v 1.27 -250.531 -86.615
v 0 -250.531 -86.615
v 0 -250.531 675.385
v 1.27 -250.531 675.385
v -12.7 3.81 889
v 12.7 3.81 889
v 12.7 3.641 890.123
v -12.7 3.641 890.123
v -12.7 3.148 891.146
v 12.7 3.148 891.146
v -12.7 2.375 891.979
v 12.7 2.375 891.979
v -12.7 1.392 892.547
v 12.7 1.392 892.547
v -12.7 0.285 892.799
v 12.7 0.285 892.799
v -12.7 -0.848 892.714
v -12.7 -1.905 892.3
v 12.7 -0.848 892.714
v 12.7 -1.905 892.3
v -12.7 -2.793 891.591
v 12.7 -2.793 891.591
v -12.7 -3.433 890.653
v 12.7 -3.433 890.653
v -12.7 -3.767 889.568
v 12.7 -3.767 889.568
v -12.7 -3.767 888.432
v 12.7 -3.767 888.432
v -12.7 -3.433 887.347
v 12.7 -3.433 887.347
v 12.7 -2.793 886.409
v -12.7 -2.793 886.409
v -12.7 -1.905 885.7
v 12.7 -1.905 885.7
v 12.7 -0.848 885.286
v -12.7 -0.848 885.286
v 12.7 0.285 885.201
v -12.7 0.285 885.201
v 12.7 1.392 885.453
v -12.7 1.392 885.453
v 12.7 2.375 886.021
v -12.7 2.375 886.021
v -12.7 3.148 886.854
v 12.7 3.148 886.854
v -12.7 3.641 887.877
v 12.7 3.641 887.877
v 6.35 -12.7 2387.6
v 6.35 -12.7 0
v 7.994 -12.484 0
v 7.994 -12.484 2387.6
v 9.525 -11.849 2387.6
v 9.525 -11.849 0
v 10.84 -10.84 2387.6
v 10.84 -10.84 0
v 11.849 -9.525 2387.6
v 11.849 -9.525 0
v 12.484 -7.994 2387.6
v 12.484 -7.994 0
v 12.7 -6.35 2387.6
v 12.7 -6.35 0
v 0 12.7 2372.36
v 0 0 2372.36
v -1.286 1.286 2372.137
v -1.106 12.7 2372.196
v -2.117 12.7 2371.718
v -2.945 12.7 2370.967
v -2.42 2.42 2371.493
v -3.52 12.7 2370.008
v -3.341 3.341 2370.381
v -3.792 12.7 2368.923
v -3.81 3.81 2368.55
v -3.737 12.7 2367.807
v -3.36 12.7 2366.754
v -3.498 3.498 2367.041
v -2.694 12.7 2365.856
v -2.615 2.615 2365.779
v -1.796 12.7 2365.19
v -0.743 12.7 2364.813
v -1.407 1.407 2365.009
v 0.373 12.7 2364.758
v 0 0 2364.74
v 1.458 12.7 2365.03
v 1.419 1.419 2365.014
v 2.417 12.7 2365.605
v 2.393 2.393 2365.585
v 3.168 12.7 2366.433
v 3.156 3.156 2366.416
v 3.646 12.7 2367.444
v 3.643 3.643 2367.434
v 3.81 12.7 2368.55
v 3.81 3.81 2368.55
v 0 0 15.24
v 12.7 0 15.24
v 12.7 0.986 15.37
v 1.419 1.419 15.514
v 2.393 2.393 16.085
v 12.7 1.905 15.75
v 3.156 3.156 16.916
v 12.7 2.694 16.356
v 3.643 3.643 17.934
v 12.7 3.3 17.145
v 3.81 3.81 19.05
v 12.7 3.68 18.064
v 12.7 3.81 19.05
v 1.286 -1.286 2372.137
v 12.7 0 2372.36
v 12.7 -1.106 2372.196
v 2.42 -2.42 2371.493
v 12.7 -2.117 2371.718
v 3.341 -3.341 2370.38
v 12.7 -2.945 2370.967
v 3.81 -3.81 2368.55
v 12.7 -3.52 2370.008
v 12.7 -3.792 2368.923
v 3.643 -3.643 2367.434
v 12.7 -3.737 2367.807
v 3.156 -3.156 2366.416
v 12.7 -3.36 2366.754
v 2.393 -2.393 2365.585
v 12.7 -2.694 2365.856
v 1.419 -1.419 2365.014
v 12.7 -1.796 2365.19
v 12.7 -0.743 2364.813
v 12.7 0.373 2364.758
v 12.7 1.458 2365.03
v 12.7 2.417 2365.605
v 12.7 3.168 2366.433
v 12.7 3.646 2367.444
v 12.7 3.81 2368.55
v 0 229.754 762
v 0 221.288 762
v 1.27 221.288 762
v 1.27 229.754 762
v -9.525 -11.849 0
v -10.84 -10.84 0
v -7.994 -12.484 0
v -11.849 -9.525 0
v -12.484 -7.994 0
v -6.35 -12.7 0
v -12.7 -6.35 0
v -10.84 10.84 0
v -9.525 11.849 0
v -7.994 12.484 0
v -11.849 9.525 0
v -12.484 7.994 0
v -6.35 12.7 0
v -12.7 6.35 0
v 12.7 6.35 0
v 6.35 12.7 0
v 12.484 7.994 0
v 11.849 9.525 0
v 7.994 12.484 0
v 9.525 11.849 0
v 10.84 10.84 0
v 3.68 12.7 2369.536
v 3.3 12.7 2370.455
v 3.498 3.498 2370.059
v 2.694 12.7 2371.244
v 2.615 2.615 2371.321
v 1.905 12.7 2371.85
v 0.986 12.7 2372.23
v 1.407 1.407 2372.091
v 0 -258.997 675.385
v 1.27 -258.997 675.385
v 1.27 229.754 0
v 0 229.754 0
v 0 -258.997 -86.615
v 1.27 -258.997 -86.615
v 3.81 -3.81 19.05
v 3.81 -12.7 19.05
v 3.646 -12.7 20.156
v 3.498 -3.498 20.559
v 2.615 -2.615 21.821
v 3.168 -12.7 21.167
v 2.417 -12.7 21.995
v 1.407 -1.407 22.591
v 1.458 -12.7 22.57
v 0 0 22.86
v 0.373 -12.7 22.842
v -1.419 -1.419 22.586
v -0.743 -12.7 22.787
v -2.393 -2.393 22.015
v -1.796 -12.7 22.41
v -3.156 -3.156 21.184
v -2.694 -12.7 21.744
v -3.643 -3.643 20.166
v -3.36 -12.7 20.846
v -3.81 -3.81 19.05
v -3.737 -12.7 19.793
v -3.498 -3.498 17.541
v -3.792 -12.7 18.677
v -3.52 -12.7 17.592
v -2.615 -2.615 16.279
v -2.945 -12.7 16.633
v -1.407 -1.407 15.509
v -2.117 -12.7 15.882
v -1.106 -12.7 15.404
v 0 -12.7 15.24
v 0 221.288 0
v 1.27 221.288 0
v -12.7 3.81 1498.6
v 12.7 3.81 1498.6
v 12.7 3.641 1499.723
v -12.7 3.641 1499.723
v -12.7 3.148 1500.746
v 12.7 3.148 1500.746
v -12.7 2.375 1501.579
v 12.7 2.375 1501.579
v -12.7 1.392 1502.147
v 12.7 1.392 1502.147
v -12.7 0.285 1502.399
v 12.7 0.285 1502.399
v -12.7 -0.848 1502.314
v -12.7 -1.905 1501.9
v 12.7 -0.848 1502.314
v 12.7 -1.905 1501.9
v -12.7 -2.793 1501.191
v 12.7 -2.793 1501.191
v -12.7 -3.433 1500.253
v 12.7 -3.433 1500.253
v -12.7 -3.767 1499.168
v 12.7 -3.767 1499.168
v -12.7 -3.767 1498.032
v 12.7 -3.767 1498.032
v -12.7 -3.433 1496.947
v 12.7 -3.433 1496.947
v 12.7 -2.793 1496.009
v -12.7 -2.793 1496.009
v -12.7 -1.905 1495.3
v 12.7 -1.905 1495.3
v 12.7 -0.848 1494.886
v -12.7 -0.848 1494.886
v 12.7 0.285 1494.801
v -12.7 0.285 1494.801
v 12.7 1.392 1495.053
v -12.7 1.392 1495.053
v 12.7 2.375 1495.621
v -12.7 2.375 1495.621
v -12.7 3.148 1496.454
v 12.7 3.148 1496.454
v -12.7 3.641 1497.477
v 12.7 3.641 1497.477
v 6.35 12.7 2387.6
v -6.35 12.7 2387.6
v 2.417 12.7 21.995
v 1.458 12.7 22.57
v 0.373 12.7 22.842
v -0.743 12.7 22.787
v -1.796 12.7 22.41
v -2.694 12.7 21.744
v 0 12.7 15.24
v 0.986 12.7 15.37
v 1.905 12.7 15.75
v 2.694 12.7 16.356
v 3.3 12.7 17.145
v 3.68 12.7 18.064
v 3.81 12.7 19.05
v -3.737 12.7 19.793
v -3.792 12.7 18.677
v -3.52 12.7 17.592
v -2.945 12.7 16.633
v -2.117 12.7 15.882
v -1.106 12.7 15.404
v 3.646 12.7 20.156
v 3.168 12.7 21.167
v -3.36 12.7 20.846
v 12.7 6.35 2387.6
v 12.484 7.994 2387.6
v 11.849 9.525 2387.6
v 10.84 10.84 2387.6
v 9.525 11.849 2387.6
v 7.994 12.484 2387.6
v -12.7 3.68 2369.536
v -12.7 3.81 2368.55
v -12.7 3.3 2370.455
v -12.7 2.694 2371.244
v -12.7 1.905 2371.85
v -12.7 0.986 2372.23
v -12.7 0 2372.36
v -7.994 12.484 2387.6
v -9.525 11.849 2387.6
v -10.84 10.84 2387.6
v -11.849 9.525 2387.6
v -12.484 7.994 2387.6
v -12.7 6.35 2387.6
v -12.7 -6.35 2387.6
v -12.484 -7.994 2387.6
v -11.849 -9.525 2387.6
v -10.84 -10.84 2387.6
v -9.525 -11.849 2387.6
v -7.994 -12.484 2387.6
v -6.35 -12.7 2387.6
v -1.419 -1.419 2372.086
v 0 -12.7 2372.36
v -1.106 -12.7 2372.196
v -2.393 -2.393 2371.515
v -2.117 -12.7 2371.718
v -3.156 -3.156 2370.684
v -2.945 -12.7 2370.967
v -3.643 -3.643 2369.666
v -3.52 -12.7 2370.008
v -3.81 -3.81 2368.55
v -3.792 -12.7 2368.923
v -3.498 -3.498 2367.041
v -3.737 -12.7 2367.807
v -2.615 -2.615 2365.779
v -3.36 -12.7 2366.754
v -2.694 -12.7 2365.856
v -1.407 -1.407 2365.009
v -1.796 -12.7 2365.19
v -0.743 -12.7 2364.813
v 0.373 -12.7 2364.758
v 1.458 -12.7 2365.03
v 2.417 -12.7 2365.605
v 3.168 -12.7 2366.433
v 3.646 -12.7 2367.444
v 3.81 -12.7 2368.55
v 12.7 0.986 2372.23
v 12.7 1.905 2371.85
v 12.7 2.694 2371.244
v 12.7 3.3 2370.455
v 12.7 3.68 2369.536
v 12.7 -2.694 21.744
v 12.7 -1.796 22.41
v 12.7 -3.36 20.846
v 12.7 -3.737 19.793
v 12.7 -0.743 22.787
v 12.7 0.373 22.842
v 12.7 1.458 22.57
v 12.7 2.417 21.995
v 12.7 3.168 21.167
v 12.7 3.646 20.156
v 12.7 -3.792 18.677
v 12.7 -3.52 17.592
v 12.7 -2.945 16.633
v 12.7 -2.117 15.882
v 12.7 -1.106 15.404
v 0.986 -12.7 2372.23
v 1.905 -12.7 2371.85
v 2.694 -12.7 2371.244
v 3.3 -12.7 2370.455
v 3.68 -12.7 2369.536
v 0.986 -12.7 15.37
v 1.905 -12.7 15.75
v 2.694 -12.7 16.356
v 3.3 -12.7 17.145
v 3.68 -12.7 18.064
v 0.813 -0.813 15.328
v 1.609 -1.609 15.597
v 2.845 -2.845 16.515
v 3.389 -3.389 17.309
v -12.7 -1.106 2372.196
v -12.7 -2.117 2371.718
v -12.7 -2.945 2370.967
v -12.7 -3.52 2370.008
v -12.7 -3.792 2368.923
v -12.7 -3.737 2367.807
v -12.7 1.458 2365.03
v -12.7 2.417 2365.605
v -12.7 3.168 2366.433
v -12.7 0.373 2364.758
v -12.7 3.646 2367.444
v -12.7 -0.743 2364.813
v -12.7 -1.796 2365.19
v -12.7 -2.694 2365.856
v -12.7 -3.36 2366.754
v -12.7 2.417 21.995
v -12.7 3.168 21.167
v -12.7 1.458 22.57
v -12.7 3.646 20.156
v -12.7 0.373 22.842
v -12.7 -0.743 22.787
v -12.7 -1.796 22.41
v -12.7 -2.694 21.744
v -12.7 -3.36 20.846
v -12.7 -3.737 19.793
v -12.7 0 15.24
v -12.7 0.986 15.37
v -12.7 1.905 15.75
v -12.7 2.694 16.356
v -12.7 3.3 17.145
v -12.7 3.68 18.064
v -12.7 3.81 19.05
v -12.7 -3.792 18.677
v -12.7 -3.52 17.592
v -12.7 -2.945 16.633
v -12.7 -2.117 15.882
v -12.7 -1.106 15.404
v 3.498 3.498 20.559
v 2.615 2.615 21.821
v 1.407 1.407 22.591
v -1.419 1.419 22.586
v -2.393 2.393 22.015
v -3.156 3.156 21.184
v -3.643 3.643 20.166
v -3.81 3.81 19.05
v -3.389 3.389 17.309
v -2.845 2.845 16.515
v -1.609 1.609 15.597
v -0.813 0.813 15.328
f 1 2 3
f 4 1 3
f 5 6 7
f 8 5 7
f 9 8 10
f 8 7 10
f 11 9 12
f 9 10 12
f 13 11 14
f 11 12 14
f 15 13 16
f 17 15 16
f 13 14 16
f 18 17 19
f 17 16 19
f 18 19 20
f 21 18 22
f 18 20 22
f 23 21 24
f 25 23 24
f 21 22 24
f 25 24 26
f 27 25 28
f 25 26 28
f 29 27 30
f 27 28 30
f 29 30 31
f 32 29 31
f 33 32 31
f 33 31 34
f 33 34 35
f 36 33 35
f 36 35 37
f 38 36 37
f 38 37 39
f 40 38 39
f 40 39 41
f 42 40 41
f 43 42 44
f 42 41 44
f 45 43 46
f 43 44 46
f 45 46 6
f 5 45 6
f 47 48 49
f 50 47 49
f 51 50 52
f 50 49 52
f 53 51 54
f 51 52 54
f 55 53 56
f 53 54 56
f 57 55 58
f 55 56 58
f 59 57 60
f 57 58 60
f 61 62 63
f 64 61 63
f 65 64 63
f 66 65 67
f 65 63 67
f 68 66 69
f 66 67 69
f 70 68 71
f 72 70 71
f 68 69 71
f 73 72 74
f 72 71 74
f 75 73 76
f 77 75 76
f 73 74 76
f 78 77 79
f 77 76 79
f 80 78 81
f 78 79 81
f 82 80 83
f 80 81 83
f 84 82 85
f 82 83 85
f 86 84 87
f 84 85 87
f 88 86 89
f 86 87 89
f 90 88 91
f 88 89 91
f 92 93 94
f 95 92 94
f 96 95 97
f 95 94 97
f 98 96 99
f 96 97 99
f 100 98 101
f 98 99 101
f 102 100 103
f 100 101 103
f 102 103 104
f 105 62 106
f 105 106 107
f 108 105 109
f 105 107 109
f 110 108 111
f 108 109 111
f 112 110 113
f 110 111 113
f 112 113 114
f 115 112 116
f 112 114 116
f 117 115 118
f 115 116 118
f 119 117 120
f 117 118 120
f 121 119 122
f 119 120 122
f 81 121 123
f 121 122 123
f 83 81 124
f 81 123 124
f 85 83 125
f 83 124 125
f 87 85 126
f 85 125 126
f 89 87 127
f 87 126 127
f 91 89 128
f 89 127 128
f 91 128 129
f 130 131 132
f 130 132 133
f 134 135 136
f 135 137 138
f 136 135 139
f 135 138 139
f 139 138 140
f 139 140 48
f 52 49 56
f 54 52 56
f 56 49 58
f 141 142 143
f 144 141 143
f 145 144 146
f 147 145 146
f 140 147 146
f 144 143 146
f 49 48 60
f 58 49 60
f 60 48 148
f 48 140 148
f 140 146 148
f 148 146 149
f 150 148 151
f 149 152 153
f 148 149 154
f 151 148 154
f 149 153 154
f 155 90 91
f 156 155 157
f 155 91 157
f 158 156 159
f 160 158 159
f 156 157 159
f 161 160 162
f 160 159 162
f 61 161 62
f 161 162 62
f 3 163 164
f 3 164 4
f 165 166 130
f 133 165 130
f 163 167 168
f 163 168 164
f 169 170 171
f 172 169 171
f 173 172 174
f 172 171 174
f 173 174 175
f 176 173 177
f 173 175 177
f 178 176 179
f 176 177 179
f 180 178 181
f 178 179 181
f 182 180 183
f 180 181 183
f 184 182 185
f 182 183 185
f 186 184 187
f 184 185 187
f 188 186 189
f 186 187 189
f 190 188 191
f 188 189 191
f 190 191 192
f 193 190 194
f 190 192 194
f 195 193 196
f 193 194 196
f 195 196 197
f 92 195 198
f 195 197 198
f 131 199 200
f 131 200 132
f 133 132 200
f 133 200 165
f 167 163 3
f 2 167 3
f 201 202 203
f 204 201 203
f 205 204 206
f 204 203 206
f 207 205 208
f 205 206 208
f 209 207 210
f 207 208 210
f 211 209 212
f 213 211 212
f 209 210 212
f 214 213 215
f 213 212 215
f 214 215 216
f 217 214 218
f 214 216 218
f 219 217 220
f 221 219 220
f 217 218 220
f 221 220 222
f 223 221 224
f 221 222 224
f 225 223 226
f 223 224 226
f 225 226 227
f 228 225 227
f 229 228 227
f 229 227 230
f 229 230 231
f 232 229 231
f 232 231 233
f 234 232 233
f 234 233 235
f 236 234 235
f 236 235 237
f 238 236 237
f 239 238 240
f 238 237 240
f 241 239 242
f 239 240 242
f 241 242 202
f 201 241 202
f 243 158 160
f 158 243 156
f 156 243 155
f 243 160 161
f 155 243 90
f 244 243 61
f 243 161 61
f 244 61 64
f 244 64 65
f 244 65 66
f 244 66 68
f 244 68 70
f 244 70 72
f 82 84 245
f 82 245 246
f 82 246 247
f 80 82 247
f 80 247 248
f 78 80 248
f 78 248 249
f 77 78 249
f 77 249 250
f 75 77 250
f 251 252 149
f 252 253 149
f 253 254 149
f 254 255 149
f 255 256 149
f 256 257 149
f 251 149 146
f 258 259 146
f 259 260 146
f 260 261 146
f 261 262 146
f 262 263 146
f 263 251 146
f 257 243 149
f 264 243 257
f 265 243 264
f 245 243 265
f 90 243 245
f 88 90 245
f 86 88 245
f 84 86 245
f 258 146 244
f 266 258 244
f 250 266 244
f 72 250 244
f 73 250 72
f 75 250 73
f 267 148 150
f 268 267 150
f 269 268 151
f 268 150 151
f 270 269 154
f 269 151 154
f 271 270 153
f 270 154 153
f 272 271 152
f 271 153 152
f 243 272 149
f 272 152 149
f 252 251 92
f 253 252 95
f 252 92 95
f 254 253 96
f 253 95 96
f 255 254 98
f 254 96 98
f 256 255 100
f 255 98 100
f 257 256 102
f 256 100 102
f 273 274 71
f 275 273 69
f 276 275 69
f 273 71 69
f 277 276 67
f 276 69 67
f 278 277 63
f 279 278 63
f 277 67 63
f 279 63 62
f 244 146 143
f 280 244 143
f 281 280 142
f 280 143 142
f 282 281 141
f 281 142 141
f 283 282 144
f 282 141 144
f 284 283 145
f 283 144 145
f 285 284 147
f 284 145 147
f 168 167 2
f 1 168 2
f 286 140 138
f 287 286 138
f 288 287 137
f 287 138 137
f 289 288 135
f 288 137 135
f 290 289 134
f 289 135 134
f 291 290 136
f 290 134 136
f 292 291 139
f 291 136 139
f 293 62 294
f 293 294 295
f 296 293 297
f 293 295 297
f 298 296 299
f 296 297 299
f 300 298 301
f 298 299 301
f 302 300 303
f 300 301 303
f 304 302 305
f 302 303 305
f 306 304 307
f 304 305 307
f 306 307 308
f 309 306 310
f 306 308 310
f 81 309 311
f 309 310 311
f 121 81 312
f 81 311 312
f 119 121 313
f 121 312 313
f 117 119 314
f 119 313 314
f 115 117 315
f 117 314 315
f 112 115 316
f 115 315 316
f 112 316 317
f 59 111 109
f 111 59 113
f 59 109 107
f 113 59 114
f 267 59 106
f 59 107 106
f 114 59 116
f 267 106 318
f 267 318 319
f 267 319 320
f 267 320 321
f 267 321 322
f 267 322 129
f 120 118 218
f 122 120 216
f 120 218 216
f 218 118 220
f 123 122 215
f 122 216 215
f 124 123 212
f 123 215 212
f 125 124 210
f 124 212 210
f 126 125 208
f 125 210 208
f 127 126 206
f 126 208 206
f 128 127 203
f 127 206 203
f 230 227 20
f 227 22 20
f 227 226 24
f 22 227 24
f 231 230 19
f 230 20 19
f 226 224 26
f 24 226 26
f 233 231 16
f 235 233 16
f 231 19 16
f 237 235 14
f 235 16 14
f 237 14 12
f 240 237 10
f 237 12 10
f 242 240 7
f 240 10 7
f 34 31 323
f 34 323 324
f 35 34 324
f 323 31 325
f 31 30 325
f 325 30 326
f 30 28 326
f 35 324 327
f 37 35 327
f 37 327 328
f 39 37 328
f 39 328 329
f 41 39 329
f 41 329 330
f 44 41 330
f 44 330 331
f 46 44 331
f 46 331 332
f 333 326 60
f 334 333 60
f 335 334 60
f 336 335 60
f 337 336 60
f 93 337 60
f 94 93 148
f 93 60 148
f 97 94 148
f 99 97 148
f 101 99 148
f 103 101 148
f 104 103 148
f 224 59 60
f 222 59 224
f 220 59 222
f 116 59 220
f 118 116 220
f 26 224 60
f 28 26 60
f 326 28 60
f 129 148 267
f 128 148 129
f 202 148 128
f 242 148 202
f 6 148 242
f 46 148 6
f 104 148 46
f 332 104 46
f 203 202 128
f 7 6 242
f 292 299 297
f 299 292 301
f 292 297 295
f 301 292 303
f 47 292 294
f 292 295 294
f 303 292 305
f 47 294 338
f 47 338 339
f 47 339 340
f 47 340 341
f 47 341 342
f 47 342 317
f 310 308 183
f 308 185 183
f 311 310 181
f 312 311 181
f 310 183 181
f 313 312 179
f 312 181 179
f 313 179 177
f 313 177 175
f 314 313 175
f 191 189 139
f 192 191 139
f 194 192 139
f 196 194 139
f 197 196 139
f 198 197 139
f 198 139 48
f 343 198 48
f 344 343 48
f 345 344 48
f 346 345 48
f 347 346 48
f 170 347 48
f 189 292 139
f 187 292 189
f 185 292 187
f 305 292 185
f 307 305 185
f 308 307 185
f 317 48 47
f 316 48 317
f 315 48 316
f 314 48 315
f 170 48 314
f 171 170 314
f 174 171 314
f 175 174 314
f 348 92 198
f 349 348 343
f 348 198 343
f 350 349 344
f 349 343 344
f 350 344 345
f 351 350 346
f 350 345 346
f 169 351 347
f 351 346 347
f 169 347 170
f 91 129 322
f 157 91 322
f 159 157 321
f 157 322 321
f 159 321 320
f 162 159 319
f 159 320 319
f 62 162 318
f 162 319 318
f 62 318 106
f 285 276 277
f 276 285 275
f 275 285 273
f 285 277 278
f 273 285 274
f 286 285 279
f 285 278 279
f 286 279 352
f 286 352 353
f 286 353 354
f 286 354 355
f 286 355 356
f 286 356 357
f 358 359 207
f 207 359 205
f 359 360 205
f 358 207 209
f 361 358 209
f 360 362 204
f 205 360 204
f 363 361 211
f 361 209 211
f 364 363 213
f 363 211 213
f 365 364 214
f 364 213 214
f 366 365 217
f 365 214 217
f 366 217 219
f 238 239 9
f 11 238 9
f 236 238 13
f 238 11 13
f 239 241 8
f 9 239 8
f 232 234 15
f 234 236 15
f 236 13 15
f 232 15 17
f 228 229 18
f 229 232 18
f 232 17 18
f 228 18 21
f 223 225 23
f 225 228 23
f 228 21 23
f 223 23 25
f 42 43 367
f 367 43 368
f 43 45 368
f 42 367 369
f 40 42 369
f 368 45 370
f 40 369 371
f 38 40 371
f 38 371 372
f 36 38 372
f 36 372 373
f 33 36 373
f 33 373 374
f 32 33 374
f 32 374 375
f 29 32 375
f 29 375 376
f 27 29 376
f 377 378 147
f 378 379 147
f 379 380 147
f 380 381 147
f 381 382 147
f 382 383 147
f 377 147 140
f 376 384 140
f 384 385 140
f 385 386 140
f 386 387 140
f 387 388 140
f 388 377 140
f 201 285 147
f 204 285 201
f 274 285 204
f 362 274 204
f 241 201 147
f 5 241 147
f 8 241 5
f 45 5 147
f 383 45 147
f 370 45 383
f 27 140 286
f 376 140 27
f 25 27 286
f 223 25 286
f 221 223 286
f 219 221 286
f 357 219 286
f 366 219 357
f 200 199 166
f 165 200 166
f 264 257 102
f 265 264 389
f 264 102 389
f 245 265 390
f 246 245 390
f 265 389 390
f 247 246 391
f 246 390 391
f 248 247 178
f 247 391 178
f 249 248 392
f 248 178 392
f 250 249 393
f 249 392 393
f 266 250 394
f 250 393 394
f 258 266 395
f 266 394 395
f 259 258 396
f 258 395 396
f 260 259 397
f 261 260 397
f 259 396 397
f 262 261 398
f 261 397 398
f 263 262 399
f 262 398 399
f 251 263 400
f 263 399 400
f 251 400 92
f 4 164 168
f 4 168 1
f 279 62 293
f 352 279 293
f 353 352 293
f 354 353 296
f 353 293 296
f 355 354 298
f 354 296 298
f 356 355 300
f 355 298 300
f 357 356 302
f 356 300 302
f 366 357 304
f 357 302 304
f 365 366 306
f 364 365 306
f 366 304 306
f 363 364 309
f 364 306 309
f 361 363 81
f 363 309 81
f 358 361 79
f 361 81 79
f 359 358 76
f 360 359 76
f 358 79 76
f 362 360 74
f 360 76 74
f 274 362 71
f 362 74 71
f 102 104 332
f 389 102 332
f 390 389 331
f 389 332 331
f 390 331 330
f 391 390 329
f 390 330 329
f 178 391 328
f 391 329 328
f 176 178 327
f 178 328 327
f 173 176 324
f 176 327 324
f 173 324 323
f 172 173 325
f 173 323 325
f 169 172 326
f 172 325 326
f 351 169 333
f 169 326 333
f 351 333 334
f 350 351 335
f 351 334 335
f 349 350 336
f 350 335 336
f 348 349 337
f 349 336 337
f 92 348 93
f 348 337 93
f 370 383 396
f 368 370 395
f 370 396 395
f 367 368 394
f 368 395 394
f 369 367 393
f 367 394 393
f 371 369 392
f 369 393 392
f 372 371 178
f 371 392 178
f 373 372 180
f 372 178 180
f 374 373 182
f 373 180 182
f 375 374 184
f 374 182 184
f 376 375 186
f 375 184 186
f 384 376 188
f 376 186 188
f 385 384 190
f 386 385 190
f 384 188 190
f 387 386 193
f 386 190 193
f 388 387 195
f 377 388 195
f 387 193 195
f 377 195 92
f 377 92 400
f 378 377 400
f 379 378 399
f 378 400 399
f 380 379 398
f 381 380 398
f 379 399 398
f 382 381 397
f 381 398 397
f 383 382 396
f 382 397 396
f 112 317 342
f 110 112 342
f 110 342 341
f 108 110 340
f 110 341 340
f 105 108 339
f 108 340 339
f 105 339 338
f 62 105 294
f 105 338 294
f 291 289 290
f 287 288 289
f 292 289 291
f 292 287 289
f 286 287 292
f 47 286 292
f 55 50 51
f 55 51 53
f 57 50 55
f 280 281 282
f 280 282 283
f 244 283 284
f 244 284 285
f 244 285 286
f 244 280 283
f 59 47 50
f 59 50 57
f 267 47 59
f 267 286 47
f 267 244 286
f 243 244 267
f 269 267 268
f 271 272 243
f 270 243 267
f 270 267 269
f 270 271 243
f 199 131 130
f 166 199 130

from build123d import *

# Parameters (mm, degrees)
F1_DEPTH  = 2387.6
F2_W      = 8.46582
F2_H      = 762
F3_DEPTH  = 1.27
F4_W      = 8.46582
F4_H      = 762
F5_DEPTH  = 1.27
F7_DEPTH  = 25.4
F8_DEPTH  = 25.4
F10_DEPTH = 25.4
F11_R     = 3.81
F12_DEPTH = 25.4


with BuildPart() as f1:
    # F0 (on Top) → F1 (new body)
    with BuildSketch(Plane.XY):
        with BuildLine():
            ThreePointArc((12.7, 6.35), (10.840128, 10.840128), (6.35, 12.7))
            Line((6.35, 12.7), (-6.35, 12.7))
            ThreePointArc((-6.35, 12.7), (-10.840128, 10.840128), (-12.7, 6.35))
            Line((-12.7, 6.35), (-12.7, -6.35))
            ThreePointArc((-12.7, -6.35), (-10.840128, -10.840128), (-6.35, -12.7))
            Line((-6.35, -12.7), (6.35, -12.7))
            ThreePointArc((6.35, -12.7), (10.840128, -10.840128), (12.7, -6.35))
            Line((12.7, -6.35), (12.7, 6.35))
        make_face()
    extrude(amount=F1_DEPTH)

    # F6 (on face) → F7 (cut)
    with BuildSketch(Plane.XZ.offset(12.7)):
        with BuildLine():
            ThreePointArc((3.81, 2368.55), (2.694077, 2371.244077), (0, 2372.36))
            ThreePointArc((0, 2372.36), (-2.694077, 2365.855923), (3.81, 2368.55))
        make_face()
    extrude(amount=-F7_DEPTH, mode=Mode.SUBTRACT)

    # F6 (on face) → F8 (cut)
    with BuildSketch(Plane.XZ.offset(12.7)):
        with BuildLine():
            ThreePointArc((0, 2372.36), (-2.694077, 2365.855923), (3.81, 2368.55))
            ThreePointArc((3.81, 2368.55), (2.694077, 2371.244077), (0, 2372.36))
        make_face()
        with BuildLine():
            ThreePointArc((0, 15.24), (2.694077, 16.355923), (3.81, 19.05))
            ThreePointArc((3.81, 19.05), (-2.694077, 21.744077), (0, 15.24))
        make_face()
    extrude(amount=-F8_DEPTH, mode=Mode.SUBTRACT)

    # F9 (on face) → F10 (cut)
    with BuildSketch(Plane.YZ.offset(12.7)):
        with BuildLine():
            ThreePointArc((3.81, 2368.55), (2.694077, 2371.244077), (0, 2372.36))
            ThreePointArc((0, 2372.36), (-2.694077, 2365.855923), (3.81, 2368.55))
        make_face()
        with BuildLine():
            ThreePointArc((3.81, 19.05), (-2.694077, 21.744077), (0, 15.24))
            ThreePointArc((0, 15.24), (2.694077, 16.355923), (3.81, 19.05))
        make_face()
    extrude(amount=-F10_DEPTH, mode=Mode.SUBTRACT)

    # F11 (on face) → F12 (cut)
    with BuildSketch(Plane.YZ.offset(12.7)):
        with Locations((0, 889)):
            Circle(F11_R)
        with Locations((0, 1498.6)):
            Circle(F11_R)
    extrude(amount=-F12_DEPTH, mode=Mode.SUBTRACT)


with BuildPart() as f3:
    # F2 (on Right) → F3 (new body)
    with BuildSketch(Plane.YZ):
        with Locations((-254.764381, 294.385428)):
            Rectangle(F2_W, F2_H)
    extrude(amount=F3_DEPTH)


with BuildPart() as f5:
    # F4 (on Right) → F5 (new body)
    with BuildSketch(Plane.YZ):
        with Locations((225.521233, 381)):
            Rectangle(F4_W, F4_H)
    extrude(amount=F5_DEPTH)


solid = Compound([f1.part, f3.part, f5.part])
